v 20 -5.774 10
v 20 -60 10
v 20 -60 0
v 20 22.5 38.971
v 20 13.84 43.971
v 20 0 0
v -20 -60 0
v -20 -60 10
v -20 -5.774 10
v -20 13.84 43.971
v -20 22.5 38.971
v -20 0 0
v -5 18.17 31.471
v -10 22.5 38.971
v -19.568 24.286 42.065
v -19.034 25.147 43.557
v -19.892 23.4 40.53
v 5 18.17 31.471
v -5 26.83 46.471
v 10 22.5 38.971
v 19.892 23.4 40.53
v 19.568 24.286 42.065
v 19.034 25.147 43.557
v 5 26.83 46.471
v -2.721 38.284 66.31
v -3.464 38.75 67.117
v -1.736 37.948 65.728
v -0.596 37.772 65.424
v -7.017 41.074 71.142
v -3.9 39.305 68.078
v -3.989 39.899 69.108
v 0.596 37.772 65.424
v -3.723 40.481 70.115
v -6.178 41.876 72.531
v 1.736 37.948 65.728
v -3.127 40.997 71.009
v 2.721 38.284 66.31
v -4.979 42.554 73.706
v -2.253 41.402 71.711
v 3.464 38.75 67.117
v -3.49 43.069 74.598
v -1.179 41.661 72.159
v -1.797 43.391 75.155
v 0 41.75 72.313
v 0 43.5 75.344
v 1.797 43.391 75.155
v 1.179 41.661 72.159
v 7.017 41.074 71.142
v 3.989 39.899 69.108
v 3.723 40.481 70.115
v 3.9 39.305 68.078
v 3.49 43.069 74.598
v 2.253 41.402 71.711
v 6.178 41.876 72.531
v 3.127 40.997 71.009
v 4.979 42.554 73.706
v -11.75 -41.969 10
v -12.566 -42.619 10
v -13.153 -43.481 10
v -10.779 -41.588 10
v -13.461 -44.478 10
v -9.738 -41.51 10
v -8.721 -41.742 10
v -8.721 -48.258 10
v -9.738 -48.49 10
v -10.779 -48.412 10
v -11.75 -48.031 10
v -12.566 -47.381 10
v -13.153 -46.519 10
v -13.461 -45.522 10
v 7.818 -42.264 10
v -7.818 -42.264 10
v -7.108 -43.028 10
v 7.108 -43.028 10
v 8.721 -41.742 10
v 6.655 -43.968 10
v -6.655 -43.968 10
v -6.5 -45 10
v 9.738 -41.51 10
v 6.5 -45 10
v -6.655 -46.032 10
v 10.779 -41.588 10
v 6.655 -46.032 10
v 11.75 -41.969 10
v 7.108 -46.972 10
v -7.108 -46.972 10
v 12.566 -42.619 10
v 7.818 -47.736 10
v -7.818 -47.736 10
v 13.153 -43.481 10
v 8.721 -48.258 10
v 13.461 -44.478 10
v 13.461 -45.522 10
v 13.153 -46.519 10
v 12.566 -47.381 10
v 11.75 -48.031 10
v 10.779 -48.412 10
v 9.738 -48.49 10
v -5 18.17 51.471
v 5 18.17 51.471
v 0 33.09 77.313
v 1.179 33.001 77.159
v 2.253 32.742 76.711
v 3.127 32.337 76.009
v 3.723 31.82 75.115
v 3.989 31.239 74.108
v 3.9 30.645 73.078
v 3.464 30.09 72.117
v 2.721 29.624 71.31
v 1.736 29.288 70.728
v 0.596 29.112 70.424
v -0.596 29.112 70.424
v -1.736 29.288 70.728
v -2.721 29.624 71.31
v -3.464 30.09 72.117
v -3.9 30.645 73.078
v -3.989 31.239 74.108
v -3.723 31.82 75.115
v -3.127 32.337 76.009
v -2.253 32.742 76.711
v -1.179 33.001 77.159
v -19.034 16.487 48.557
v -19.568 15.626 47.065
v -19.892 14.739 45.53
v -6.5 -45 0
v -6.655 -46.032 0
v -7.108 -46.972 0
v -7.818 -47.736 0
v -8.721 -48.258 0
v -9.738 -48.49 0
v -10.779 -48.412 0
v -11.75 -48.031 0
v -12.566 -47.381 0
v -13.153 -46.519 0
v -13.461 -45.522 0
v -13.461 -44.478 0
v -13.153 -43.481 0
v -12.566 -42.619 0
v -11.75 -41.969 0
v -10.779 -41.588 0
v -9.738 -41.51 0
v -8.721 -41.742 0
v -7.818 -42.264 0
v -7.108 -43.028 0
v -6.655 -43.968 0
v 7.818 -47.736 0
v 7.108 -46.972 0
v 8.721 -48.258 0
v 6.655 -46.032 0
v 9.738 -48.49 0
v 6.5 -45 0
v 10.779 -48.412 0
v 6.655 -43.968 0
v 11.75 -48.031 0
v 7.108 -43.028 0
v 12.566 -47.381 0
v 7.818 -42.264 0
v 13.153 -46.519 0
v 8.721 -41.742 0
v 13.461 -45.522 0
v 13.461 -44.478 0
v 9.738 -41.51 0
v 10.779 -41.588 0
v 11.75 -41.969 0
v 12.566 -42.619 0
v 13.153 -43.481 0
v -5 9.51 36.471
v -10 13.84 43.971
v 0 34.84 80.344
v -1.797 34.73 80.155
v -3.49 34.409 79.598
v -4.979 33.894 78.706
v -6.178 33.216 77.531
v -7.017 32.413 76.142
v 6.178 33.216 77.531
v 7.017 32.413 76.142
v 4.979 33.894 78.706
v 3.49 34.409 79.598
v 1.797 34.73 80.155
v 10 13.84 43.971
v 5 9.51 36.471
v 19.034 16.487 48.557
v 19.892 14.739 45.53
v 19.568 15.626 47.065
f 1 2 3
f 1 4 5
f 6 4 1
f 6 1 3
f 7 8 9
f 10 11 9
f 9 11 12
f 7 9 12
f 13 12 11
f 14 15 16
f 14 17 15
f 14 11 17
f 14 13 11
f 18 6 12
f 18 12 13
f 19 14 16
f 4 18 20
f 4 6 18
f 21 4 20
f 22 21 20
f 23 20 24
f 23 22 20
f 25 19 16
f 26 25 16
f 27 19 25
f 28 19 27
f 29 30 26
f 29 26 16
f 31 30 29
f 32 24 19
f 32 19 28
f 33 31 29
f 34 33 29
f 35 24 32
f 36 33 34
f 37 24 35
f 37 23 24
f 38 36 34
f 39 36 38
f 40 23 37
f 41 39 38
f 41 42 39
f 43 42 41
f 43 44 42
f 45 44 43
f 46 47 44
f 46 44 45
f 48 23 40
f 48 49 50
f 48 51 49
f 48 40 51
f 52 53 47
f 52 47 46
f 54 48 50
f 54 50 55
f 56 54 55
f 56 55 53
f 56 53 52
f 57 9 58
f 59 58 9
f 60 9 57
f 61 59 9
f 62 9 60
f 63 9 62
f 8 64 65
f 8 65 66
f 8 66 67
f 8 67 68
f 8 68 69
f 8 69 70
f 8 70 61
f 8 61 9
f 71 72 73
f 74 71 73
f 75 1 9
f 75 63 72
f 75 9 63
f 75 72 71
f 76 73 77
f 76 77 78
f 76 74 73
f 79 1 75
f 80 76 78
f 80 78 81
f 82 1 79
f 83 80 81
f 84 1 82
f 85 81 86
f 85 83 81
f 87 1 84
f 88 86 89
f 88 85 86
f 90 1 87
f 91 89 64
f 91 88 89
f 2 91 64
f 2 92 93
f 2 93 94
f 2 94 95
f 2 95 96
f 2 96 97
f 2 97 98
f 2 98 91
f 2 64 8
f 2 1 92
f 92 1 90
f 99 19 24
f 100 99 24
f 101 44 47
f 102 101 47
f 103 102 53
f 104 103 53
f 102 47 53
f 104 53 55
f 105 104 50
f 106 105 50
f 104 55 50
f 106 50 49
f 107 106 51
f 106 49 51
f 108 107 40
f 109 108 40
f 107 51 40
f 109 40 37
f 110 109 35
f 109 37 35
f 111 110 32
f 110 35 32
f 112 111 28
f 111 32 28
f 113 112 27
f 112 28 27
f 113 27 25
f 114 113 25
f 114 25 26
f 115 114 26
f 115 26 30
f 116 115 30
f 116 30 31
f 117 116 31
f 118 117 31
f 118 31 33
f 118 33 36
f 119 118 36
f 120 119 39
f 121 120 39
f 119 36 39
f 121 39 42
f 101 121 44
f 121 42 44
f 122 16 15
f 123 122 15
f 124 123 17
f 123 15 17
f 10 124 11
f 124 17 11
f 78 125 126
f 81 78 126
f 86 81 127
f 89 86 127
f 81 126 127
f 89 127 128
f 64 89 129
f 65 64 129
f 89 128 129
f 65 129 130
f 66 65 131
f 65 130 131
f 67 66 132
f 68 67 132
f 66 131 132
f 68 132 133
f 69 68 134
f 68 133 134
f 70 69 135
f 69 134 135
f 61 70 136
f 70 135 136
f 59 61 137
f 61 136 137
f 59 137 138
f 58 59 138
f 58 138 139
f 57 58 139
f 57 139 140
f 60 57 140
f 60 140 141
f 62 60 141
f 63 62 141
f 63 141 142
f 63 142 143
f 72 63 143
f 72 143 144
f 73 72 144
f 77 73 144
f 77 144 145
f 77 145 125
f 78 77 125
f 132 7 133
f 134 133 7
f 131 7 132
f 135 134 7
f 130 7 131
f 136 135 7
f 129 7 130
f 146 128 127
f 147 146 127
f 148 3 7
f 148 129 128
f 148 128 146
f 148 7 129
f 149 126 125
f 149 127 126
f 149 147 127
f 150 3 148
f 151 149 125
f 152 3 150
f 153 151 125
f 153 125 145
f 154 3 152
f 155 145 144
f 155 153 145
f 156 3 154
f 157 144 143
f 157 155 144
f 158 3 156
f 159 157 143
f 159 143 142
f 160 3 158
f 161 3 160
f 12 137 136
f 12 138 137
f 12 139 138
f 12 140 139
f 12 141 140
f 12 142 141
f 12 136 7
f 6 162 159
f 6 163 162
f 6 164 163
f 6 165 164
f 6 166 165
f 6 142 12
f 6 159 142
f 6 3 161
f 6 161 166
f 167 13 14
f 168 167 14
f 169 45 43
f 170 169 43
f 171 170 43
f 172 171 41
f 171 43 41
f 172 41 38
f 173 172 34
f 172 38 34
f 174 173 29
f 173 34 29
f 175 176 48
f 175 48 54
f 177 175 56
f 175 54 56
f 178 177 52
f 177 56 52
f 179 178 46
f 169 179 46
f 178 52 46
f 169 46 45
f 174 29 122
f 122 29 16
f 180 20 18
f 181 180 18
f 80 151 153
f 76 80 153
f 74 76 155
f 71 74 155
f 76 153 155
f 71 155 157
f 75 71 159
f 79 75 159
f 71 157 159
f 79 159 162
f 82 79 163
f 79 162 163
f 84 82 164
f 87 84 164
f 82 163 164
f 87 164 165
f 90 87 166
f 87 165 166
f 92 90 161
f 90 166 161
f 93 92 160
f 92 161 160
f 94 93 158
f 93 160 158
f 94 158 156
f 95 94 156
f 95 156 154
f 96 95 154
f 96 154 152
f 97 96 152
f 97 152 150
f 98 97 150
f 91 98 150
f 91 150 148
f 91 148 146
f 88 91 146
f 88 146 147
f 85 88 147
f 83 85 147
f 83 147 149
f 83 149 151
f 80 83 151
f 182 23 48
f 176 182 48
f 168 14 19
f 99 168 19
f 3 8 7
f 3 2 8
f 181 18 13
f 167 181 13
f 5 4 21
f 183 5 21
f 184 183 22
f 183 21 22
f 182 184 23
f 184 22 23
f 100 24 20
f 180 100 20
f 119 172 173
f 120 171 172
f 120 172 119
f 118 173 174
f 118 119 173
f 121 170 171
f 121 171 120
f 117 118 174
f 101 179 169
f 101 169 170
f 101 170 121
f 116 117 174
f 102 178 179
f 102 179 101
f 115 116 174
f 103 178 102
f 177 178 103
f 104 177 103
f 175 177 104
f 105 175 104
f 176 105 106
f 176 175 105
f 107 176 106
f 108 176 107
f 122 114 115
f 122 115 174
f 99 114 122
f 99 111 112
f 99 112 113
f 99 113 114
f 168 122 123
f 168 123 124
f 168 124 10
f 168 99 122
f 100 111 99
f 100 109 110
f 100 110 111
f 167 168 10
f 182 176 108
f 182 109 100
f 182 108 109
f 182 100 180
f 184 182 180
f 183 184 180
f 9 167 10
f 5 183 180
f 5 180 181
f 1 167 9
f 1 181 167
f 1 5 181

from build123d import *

# Parameters (mm, degrees)
EXTRUDE_THIN1_DEPTH = 20
CUT_EXTRUDE1_REACH  = 104.251
SKETCH2_R           = 3.5
CUT_EXTRUDE9_DEPTH  = 10
SKETCH6_R           = 4
CUT_EXTRUDE10_DEPTH = 10


with BuildPart() as part:
    # Sketch1 → Extrude-Thin1 (new, symmetric)
    with BuildSketch(Plane(origin=(0, 0, 0), x_dir=(0, 0, -1), z_dir=(1, 0, 0))):
        Polygon((0, -60), (0, 0), (-75.344210129, 43.5), (-80.344210129, 34.839745962), (-10, -5.773502692), (-10, -60), align=None)
    extrude(amount=EXTRUDE_THIN1_DEPTH, both=True)

    # Sketch2 → Cut-Extrude1 (cut, up to next)
    with BuildSketch(Plane(origin=(0, 0, 0), x_dir=(-1, 0, 0), z_dir=(0, 0, -1)), mode=Mode.PRIVATE) as cut_extrude1_sk1:
        with Locations((-10, -45)):
            Circle(SKETCH2_R)
    cut_extrude1_tool1 = extrude(cut_extrude1_sk1.sketch, amount=-CUT_EXTRUDE1_REACH, mode=Mode.PRIVATE) & part.part
    # Sketch2 → Cut-Extrude1 (cut, up to next)
    with BuildSketch(Plane(origin=(0, 0, 0), x_dir=(-1, 0, 0), z_dir=(0, 0, -1)), mode=Mode.PRIVATE) as cut_extrude1_sk2:
        with Locations(Location((10, -45, 0), (0, 0, 180))):
            Circle(SKETCH2_R)
    cut_extrude1_tool2 = extrude(cut_extrude1_sk2.sketch, amount=-CUT_EXTRUDE1_REACH, mode=Mode.PRIVATE) & part.part
    add(cut_extrude1_tool1.solids().sort_by_distance((10, -45, 0))[0], mode=Mode.SUBTRACT)
    add(cut_extrude1_tool2.solids().sort_by_distance((-10, -45, 0))[0], mode=Mode.SUBTRACT)

    # Sketch3 → Cut-Extrude9 (cut)
    with BuildSketch(Plane(origin=(0, 0, 0), x_dir=(1, 0, 0), z_dir=(0, 0.8660254037844398, -0.499999999999998))):
        Polygon((29.732274902, -45), (20, -45), (20, -87), (9.8e-08, -87), (-20, -87), (-20, -45), (-32.034408351, -45), (-32.034408351, -100.781822996), (29.732274902, -100.781822996), align=None)
        with BuildLine():
            ThreePointArc((-19.034409454, -50.29484195), (-19.756628033, -47.691083257), (-20, -45))
            Line((-20, -45), (-20, -87))
            Line((-20, -87), (9.8e-08, -87))
            ThreePointArc((9.8e-08, -87), (-4.265814225, -85.668697512), (-7.017204727, -82.147420975))
            Line((-7.017204727, -82.147420975), (-19.034409454, -50.29484195))
        make_face()
        with BuildLine():
            Line((20, -87), (20, -45))
            ThreePointArc((20, -45), (19.756628033, -47.691083257), (19.034409454, -50.29484195))
            Line((19.034409454, -50.29484195), (7.017204727, -82.147420975))
            ThreePointArc((7.017204727, -82.147420975), (4.265814305, -85.668697457), (9.8e-08, -87))
            Line((9.8e-08, -87), (20, -87))
        make_face()
    extrude(amount=-CUT_EXTRUDE9_DEPTH, mode=Mode.SUBTRACT)

    # Sketch6 → Cut-Extrude10 (cut)
    with BuildSketch(Plane(origin=(0, 0, 0), x_dir=(1, 0, 0), z_dir=(0, 0.8660254037844398, -0.499999999999998))):
        with Locations(Location((0, -79.5, 0), (0, 0, 270))):
            Circle(SKETCH6_R)
        Polygon((10, -45), (5, -36.339745962), (-5, -36.339745962), (-10, -45), (-5, -53.660254038), (5, -53.660254038), align=None)
    extrude(amount=-CUT_EXTRUDE10_DEPTH, mode=Mode.SUBTRACT)


solid = part.part
